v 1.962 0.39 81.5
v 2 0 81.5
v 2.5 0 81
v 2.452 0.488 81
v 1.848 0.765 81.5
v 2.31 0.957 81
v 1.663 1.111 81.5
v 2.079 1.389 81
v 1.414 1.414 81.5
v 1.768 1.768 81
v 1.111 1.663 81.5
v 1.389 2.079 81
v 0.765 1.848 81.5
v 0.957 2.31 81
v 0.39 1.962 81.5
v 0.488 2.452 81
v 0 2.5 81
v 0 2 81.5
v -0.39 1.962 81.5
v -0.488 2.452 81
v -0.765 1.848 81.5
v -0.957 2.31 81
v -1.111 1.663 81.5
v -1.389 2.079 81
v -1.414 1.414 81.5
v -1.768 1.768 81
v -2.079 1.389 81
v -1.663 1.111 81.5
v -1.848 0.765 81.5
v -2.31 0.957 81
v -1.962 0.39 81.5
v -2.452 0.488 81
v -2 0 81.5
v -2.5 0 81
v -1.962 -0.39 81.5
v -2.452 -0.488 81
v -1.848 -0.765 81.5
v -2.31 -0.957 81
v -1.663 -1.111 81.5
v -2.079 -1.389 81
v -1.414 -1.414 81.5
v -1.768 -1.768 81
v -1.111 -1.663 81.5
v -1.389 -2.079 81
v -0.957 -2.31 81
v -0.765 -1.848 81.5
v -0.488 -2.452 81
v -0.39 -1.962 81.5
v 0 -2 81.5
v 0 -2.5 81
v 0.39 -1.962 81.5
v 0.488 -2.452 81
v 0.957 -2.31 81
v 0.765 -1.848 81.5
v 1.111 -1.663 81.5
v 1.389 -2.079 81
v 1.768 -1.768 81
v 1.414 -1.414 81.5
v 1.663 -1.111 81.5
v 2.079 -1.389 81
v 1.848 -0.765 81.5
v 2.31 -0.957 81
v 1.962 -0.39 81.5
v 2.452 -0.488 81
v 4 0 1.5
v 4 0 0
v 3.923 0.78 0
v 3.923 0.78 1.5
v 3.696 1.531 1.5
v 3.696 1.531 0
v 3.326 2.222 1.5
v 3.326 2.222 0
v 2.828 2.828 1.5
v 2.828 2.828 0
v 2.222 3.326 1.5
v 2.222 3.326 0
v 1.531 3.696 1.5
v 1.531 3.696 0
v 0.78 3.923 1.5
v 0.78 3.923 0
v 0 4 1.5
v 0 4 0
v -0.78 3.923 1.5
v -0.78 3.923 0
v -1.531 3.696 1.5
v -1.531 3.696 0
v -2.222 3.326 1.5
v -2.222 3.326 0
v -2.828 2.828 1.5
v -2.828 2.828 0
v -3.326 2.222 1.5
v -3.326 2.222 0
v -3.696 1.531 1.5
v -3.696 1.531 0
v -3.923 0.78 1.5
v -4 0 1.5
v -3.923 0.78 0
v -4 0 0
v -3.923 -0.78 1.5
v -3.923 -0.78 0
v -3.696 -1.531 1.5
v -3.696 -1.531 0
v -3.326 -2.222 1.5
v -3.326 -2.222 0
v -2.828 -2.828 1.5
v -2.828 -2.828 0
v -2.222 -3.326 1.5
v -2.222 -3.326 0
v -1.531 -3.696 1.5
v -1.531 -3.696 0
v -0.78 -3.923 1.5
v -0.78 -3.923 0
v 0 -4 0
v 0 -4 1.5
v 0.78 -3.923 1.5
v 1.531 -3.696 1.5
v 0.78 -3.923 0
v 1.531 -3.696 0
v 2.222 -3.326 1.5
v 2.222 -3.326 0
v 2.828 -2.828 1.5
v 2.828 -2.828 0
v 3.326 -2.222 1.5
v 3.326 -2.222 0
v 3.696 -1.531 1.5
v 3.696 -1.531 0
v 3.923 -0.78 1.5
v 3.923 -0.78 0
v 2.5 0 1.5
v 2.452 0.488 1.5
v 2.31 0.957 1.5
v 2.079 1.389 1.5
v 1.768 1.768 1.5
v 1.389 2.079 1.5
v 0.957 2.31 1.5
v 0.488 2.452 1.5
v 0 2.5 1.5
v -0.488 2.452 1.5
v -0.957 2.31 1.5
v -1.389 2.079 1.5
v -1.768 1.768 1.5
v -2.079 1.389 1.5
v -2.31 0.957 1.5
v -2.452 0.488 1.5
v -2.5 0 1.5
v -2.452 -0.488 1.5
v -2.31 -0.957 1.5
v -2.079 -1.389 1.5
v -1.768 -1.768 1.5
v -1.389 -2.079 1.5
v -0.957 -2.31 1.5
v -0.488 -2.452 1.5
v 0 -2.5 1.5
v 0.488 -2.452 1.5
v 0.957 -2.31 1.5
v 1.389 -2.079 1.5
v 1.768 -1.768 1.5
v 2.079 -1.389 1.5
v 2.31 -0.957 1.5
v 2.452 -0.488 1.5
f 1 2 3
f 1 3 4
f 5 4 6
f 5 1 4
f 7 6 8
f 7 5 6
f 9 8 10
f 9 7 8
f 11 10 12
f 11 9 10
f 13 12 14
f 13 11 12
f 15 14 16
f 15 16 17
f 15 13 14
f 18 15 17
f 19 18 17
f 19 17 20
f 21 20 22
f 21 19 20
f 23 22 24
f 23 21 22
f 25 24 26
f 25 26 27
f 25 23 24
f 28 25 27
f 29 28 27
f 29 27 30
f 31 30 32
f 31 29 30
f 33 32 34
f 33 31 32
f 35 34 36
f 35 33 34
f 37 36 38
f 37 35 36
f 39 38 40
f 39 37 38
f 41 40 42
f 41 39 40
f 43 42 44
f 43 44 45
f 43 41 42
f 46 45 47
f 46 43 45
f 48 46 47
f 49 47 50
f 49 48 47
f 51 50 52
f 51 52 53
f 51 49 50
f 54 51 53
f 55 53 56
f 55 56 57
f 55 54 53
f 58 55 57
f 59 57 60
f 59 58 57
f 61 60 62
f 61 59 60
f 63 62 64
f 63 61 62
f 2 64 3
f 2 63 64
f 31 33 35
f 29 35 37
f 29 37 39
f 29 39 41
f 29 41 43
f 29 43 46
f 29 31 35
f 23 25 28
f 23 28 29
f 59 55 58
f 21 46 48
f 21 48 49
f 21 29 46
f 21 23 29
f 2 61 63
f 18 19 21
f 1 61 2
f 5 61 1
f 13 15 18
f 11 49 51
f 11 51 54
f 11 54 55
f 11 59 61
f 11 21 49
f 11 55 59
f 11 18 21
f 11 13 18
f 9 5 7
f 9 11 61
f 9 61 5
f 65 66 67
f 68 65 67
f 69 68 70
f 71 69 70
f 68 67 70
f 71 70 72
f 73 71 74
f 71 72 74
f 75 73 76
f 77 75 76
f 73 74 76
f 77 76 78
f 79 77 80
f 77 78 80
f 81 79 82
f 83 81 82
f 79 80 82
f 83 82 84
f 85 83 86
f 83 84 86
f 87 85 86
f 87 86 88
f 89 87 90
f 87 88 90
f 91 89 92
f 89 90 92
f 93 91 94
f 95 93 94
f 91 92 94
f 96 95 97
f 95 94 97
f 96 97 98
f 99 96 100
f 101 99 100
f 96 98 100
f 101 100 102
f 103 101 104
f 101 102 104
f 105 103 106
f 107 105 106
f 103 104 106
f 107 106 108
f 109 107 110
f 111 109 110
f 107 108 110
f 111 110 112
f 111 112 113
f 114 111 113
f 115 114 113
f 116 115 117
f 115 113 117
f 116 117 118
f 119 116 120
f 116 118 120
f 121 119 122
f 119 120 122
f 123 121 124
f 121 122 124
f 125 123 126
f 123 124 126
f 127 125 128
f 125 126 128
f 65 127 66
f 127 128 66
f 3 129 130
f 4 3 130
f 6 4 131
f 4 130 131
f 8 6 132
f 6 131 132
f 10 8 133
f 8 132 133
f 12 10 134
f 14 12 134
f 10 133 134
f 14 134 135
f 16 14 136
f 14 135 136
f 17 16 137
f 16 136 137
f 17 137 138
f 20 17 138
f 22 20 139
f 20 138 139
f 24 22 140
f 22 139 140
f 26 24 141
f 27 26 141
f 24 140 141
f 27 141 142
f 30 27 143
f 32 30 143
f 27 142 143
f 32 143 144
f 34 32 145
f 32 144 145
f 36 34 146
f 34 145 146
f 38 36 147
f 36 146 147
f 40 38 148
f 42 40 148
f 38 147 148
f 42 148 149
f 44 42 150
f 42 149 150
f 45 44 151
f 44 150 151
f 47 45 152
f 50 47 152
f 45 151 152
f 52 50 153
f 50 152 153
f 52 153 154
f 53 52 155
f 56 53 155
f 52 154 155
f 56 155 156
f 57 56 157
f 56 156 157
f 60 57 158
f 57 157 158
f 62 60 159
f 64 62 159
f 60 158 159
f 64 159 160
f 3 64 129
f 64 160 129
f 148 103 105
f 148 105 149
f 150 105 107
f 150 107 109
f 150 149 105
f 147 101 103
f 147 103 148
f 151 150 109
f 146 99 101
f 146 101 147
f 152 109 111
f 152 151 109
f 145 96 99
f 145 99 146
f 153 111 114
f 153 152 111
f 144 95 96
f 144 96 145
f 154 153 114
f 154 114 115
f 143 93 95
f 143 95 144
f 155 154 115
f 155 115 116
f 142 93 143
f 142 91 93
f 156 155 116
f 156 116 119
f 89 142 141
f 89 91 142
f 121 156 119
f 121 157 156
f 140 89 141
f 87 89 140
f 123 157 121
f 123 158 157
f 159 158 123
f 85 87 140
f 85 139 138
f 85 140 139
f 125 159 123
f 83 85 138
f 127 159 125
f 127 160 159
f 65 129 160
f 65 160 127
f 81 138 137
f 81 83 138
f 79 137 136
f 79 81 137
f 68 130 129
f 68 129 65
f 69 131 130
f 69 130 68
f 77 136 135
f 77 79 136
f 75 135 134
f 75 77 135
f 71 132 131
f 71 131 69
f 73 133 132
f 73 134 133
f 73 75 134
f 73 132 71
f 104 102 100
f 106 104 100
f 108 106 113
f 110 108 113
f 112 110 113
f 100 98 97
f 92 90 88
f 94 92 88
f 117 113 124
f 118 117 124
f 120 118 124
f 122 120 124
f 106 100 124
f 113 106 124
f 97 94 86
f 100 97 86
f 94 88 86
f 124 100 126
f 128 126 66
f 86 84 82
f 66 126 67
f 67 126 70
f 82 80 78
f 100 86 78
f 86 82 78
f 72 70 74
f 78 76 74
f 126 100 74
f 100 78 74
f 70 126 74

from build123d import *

# Parameters (mm, degrees)
SKETCH1_R           = 4
BOSS_EXTRUDE1_DEPTH = 1.5
SKETCH2_R           = 2.5
BOSS_EXTRUDE2_DEPTH = 80
CHAMFER1_SIZE       = 0.5


with BuildPart() as part:
    # Sketch1 → Boss-Extrude1 (new body)
    with BuildSketch(Plane.XY):
        Circle(SKETCH1_R)
    extrude(amount=BOSS_EXTRUDE1_DEPTH)

    # Sketch2 → Boss-Extrude2 (add)
    with BuildSketch(Plane.XY.offset(1.5)):
        Circle(SKETCH2_R)
    extrude(amount=BOSS_EXTRUDE2_DEPTH)

    # Chamfer1
    chamfer1_edges = [part.edges().sort_by_distance(p)[0] for p in [
        (-2.5, 0, 81.5),
    ]]
    chamfer(chamfer1_edges, length=CHAMFER1_SIZE)


solid = part.part
